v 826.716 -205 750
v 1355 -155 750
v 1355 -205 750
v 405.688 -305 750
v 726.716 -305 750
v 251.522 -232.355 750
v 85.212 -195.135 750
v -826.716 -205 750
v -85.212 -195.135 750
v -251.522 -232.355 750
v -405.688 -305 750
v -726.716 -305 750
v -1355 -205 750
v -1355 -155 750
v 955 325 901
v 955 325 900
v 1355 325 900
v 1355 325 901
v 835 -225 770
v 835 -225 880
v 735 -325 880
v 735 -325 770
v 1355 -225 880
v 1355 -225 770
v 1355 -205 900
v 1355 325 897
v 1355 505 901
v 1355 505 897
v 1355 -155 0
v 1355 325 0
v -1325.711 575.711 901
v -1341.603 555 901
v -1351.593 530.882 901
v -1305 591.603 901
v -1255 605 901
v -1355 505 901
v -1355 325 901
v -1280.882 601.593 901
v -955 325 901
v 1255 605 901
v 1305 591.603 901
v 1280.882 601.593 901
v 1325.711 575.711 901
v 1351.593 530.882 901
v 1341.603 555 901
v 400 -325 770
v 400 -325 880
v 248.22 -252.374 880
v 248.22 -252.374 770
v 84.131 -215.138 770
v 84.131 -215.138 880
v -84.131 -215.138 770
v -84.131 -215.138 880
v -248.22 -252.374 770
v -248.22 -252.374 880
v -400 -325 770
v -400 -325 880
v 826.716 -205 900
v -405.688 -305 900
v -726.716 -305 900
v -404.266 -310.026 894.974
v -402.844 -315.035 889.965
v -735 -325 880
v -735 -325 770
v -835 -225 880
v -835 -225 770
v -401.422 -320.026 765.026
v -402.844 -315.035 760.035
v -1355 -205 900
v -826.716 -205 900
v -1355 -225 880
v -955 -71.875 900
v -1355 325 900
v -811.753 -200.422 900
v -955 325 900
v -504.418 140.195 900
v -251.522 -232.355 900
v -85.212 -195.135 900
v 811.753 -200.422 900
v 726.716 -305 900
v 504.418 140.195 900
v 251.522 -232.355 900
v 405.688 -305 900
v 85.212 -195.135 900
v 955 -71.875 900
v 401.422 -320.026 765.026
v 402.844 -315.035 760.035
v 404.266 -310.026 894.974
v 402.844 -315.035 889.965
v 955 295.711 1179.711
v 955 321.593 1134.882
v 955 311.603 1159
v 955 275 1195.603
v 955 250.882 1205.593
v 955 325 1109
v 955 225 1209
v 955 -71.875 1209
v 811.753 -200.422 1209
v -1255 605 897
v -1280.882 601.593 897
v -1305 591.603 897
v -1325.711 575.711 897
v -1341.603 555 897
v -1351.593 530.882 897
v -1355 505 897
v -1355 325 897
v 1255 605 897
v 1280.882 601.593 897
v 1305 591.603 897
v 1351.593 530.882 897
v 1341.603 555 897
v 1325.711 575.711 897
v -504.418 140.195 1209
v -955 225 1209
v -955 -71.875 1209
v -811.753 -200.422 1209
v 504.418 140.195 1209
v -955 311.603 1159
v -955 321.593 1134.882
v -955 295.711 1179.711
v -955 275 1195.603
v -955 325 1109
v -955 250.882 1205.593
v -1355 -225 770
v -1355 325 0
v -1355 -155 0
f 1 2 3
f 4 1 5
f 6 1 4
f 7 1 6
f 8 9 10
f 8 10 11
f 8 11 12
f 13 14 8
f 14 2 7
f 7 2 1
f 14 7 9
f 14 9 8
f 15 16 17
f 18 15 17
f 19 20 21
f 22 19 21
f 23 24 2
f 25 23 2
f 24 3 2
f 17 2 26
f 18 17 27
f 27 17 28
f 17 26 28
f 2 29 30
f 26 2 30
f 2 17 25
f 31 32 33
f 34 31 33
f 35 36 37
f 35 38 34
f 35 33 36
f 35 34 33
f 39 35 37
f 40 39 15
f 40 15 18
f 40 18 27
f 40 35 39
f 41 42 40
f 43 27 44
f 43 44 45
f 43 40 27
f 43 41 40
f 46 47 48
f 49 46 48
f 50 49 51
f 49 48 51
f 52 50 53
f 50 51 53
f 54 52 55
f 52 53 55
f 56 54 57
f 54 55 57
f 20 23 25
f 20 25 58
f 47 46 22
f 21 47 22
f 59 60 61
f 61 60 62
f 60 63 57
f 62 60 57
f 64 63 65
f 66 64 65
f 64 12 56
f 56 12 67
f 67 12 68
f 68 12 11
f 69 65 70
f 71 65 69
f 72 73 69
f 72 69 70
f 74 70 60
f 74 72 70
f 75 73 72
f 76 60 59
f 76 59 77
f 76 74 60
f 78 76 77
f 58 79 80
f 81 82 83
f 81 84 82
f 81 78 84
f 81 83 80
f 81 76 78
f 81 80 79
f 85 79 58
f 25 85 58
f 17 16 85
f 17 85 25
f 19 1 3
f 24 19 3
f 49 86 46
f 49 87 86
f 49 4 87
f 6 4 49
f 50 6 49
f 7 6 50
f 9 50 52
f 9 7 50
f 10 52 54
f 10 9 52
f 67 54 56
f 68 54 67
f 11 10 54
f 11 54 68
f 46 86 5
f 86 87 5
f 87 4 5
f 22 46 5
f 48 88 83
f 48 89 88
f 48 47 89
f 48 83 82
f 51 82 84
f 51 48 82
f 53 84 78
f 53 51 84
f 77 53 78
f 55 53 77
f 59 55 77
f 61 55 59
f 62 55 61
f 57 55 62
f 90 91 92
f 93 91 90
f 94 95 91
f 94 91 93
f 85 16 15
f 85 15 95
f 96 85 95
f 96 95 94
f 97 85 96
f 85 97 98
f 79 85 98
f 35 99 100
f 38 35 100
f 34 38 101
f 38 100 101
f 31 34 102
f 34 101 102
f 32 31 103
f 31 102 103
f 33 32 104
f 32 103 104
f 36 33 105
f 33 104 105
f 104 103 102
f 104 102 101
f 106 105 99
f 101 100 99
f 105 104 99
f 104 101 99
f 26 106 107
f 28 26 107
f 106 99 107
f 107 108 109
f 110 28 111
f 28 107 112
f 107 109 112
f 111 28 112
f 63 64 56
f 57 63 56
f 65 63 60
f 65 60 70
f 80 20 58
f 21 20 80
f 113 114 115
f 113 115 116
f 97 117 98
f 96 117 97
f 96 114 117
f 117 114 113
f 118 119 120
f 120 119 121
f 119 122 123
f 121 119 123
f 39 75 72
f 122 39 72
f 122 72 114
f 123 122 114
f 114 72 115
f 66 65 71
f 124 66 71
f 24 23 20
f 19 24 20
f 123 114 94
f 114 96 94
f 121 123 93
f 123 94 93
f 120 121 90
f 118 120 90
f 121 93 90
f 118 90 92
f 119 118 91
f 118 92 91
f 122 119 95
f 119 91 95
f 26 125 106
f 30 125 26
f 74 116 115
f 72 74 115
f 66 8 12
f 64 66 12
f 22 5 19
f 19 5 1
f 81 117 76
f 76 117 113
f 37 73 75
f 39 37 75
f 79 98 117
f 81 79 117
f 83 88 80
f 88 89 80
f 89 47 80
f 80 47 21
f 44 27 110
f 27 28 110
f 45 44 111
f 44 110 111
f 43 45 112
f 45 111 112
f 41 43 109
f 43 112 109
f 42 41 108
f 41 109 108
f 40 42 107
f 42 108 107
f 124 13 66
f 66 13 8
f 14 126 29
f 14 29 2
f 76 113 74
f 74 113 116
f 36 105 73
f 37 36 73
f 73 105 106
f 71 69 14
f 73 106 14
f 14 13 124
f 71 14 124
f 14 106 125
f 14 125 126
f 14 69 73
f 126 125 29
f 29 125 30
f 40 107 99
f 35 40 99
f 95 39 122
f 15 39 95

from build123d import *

# Parameters (mm, degrees)
F0_W          = 2710
F0_H          = 650
F1_DEPTH      = 1209
F2_W          = 400
F2_H          = 309
F3_DEPTH      = 650.001
F5_DEPTH      = 3
F5_DEPTH_BACK = 1
F6_W          = 170
F6_H          = 750
F7_DEPTH      = 2710.001
F8_R          = 100
F10_DEPTH     = 309
F12_DEPTH     = 900.001
F13_SIZE      = 20


with BuildPart() as f1:
    # F0 (on Top) → F1 (new body)
    with BuildSketch(Plane.XY):
        Rectangle(F0_W, F0_H)
    extrude(amount=F1_DEPTH)

    # F2 (on face) → F3 (cut, through all)
    with BuildSketch(Plane.XZ.offset(325)):
        with Locations((-1155, 1054.5)):
            Rectangle(F2_W, F2_H)
        with Locations((1155, 1054.5)):
            Rectangle(F2_W, F2_H)
    extrude(amount=-F3_DEPTH, mode=Mode.SUBTRACT)

    # F4 (on face) → F5 (join, two sides)
    with BuildSketch(Plane.XY.offset(900)) as f5_sk:
        with BuildLine():
            Line((-1355, 505), (-1355, 325))
            Line((-1355, 325), (1355, 325))
            Line((1355, 325), (1355, 505))
            ThreePointArc((1355, 505), (1325.7106781187, 575.7106781187), (1255, 605))
            Line((1255, 605), (0, 605))
            Line((0, 605), (-1255, 605))
            ThreePointArc((-1255, 605), (-1325.7106781187, 575.7106781187), (-1355, 505))
        make_face()
    extrude(amount=-F5_DEPTH)
    extrude(f5_sk.sketch, amount=F5_DEPTH_BACK)

    # F6 (on face) → F7 (cut, through all)
    with BuildSketch(Plane(origin=(-1355, 0, 0), x_dir=(0, -1, 0), z_dir=(-1, 0, 0))):
        with Locations((240, 375)):
            Rectangle(F6_W, F6_H)
    extrude(amount=-F7_DEPTH, mode=Mode.SUBTRACT)

    # F8
    f8_edges = [f1.edges().sort_by_distance(p)[0] for p in [
        (0, 325, 1209),
    ]]
    fillet(f8_edges, radius=F8_R)

    # F9 (on face) → F10 (cut, through all)
    with BuildSketch(Plane.XY.offset(1209)):
        Polygon((-811.7530941963, -200.4219144583), (-955, -71.8745142221), (-955, -325), (0, -325), (955, -325), (955, -71.8745142221), (811.7530941963, -200.4219144583), (504.4178025086, 140.1952058077), (0, 140.1952058077), (-504.4178025086, 140.1952058077), align=None)
    extrude(amount=-F10_DEPTH, mode=Mode.SUBTRACT)

    # F11 (on face) → F12 (cut, through all)
    with BuildSketch(Plane.XY.offset(900)):
        with BuildLine():
            Line((-400, -325), (400, -325))
            ThreePointArc((400, -325), (0, -210.4393653505), (-400, -325))
        make_face()
        Polygon((-735, -325), (-835, -225), (-1355, -225), (-1355, -325), align=None)
        Polygon((1355, -225), (835, -225), (735, -325), (1355, -325), align=None)
    extrude(amount=-F12_DEPTH, mode=Mode.SUBTRACT)

    # F13
    f13_edges = [f1.edges().sort_by_distance(p)[0] for p in [
        (-1095, -225, 900),
        (-785, -275, 900),
        (-567.5, -325, 900),
        (0, -210.439365, 900),
        (567.5, -325, 900),
        (1095, -225, 900),
        (-1095, -225, 750),
        (-785, -275, 750),
        (-567.5, -325, 750),
        (0, -210.439365, 750),
        (567.5, -325, 750),
        (1095, -225, 750),
        (785, -275, 900),
        (785, -275, 750),
    ]]
    chamfer(f13_edges, length=F13_SIZE)


solid = f1.part
